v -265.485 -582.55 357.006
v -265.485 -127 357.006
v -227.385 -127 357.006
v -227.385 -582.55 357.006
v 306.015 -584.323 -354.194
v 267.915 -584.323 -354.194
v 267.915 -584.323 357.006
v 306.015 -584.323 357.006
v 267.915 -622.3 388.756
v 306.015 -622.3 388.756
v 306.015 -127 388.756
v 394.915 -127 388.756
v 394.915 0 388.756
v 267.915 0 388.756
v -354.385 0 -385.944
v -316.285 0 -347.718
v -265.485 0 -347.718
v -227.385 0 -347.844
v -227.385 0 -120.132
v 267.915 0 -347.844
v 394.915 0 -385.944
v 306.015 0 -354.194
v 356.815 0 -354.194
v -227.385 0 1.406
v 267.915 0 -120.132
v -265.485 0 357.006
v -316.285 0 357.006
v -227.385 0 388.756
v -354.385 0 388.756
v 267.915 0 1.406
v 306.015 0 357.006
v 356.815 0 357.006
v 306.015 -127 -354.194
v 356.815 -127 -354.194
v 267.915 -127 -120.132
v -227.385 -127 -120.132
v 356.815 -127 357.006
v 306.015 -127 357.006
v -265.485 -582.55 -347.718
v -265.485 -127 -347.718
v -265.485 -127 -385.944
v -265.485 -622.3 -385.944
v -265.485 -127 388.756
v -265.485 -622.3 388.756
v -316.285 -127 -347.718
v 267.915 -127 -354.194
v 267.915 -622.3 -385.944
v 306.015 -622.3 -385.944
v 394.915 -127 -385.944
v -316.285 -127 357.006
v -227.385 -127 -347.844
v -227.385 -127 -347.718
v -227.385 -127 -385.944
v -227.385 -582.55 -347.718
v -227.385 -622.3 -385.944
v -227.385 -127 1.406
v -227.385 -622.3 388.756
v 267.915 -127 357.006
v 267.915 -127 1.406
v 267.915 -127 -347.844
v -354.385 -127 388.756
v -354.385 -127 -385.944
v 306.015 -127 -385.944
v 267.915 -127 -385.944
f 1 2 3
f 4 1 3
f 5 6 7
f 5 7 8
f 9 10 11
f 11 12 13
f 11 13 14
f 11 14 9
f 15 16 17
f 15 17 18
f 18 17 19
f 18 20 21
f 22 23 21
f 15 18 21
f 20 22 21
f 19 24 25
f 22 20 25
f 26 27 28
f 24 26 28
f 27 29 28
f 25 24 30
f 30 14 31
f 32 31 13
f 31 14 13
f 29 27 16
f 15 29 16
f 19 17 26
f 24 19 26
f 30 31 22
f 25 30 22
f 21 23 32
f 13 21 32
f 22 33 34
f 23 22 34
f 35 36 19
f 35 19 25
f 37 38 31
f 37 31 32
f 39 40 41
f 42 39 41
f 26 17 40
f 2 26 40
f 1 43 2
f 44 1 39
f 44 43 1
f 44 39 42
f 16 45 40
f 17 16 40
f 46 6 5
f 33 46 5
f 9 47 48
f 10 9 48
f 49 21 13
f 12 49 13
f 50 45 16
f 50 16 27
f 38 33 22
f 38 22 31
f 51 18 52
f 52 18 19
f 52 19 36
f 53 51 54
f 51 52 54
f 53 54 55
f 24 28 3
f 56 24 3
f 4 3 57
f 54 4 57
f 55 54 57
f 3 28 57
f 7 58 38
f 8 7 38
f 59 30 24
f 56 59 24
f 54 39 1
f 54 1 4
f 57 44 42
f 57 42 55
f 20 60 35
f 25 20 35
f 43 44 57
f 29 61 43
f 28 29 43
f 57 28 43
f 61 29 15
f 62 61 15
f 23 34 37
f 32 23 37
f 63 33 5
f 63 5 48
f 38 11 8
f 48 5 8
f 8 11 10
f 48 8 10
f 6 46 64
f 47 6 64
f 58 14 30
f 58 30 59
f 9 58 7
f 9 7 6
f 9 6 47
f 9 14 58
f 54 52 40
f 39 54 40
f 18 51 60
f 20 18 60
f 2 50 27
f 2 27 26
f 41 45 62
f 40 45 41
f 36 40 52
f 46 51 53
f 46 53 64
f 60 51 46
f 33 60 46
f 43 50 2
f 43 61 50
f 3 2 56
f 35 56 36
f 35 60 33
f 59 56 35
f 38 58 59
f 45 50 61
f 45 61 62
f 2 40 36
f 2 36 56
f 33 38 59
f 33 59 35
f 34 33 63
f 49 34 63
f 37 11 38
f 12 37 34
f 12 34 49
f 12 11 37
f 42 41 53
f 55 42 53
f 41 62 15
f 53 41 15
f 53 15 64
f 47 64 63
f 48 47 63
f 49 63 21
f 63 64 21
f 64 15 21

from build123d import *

# Parameters (mm, degrees)
F1_DEPTH  = 127
F2_W      = 50.8
F2_H      = 704.724253
F3_DEPTH  = 127
F4_W      = 50.8
F4_H      = 711.2
F5_DEPTH  = 127
F6_W      = 495.3
F6_H      = 227.711381
F7_DEPTH  = 127
F8_W      = 38.1
F8_H      = 31.75
F9_DEPTH  = 495.3
F10_W     = 38.1
F10_H     = 39.75013
F11_DEPTH = 736.6
F12_W     = 38.1
F12_H     = 37.97719
F13_DEPTH = 736.6


with BuildPart() as f1:
    # F0 (on Front) → F1 (new body)
    with BuildSketch(Plane.XZ):
        Polygon((-227.385405, 388.756426), (-354.385405, 388.756426), (-354.385405, -385.943574), (394.914595, -385.943574), (394.914595, 388.756426), (267.914595, 388.756426), (267.914595, 1.406426), (-227.385405, 1.406426), align=None)
    extrude(amount=F1_DEPTH)

    # F2 (on face) → F3 (cut)
    with BuildSketch(Plane.XZ.offset(127)):
        with Locations((-290.885405, 4.644299)):
            Rectangle(F2_W, F2_H)
    extrude(amount=-F3_DEPTH, mode=Mode.SUBTRACT)

    # F4 (on face) → F5 (cut)
    with BuildSketch(Plane.XZ.offset(127)):
        with Locations((331.414595, 1.406426)):
            Rectangle(F4_W, F4_H)
    extrude(amount=-F5_DEPTH, mode=Mode.SUBTRACT)

    # F6 (on face) → F7 (cut)
    with BuildSketch(Plane.XZ.offset(127)):
        with Locations((20.264595, -233.987884)):
            Rectangle(F6_W, F6_H)
    extrude(amount=-F7_DEPTH, mode=Mode.SUBTRACT)

    # F8 (on face) → F9 (join)
    with BuildSketch(Plane.XZ.offset(127)):
        with Locations((-246.435405, 372.881426)):
            Rectangle(F8_W, F8_H)
        with Locations((286.964595, 372.881426)):
            Rectangle(F8_W, F8_H)
        with Locations((286.964595, -370.068574)):
            Rectangle(F8_W, F8_H)
        Polygon((-227.385405, -347.717827), (-265.485405, -347.717827), (-265.485405, -385.943574), (-227.385405, -385.943574), (-227.385405, -347.843574), align=None)
    extrude(amount=F9_DEPTH)

    # F10 (on face) → F11 (join)
    with BuildSketch(Plane(origin=(0, 0, 357.006426), x_dir=(1, 0, 0), z_dir=(0, 0, -1))):
        with Locations((-246.435405, 602.424935)):
            Rectangle(F10_W, F10_H)
    extrude(amount=F11_DEPTH)

    # F12 (on face) → F13 (join)
    with BuildSketch(Plane(origin=(0, 0, 357.006426), x_dir=(1, 0, 0), z_dir=(0, 0, -1))):
        with Locations((286.964595, 603.311405)):
            Rectangle(F12_W, F12_H)
    extrude(amount=F13_DEPTH)


solid = f1.part
